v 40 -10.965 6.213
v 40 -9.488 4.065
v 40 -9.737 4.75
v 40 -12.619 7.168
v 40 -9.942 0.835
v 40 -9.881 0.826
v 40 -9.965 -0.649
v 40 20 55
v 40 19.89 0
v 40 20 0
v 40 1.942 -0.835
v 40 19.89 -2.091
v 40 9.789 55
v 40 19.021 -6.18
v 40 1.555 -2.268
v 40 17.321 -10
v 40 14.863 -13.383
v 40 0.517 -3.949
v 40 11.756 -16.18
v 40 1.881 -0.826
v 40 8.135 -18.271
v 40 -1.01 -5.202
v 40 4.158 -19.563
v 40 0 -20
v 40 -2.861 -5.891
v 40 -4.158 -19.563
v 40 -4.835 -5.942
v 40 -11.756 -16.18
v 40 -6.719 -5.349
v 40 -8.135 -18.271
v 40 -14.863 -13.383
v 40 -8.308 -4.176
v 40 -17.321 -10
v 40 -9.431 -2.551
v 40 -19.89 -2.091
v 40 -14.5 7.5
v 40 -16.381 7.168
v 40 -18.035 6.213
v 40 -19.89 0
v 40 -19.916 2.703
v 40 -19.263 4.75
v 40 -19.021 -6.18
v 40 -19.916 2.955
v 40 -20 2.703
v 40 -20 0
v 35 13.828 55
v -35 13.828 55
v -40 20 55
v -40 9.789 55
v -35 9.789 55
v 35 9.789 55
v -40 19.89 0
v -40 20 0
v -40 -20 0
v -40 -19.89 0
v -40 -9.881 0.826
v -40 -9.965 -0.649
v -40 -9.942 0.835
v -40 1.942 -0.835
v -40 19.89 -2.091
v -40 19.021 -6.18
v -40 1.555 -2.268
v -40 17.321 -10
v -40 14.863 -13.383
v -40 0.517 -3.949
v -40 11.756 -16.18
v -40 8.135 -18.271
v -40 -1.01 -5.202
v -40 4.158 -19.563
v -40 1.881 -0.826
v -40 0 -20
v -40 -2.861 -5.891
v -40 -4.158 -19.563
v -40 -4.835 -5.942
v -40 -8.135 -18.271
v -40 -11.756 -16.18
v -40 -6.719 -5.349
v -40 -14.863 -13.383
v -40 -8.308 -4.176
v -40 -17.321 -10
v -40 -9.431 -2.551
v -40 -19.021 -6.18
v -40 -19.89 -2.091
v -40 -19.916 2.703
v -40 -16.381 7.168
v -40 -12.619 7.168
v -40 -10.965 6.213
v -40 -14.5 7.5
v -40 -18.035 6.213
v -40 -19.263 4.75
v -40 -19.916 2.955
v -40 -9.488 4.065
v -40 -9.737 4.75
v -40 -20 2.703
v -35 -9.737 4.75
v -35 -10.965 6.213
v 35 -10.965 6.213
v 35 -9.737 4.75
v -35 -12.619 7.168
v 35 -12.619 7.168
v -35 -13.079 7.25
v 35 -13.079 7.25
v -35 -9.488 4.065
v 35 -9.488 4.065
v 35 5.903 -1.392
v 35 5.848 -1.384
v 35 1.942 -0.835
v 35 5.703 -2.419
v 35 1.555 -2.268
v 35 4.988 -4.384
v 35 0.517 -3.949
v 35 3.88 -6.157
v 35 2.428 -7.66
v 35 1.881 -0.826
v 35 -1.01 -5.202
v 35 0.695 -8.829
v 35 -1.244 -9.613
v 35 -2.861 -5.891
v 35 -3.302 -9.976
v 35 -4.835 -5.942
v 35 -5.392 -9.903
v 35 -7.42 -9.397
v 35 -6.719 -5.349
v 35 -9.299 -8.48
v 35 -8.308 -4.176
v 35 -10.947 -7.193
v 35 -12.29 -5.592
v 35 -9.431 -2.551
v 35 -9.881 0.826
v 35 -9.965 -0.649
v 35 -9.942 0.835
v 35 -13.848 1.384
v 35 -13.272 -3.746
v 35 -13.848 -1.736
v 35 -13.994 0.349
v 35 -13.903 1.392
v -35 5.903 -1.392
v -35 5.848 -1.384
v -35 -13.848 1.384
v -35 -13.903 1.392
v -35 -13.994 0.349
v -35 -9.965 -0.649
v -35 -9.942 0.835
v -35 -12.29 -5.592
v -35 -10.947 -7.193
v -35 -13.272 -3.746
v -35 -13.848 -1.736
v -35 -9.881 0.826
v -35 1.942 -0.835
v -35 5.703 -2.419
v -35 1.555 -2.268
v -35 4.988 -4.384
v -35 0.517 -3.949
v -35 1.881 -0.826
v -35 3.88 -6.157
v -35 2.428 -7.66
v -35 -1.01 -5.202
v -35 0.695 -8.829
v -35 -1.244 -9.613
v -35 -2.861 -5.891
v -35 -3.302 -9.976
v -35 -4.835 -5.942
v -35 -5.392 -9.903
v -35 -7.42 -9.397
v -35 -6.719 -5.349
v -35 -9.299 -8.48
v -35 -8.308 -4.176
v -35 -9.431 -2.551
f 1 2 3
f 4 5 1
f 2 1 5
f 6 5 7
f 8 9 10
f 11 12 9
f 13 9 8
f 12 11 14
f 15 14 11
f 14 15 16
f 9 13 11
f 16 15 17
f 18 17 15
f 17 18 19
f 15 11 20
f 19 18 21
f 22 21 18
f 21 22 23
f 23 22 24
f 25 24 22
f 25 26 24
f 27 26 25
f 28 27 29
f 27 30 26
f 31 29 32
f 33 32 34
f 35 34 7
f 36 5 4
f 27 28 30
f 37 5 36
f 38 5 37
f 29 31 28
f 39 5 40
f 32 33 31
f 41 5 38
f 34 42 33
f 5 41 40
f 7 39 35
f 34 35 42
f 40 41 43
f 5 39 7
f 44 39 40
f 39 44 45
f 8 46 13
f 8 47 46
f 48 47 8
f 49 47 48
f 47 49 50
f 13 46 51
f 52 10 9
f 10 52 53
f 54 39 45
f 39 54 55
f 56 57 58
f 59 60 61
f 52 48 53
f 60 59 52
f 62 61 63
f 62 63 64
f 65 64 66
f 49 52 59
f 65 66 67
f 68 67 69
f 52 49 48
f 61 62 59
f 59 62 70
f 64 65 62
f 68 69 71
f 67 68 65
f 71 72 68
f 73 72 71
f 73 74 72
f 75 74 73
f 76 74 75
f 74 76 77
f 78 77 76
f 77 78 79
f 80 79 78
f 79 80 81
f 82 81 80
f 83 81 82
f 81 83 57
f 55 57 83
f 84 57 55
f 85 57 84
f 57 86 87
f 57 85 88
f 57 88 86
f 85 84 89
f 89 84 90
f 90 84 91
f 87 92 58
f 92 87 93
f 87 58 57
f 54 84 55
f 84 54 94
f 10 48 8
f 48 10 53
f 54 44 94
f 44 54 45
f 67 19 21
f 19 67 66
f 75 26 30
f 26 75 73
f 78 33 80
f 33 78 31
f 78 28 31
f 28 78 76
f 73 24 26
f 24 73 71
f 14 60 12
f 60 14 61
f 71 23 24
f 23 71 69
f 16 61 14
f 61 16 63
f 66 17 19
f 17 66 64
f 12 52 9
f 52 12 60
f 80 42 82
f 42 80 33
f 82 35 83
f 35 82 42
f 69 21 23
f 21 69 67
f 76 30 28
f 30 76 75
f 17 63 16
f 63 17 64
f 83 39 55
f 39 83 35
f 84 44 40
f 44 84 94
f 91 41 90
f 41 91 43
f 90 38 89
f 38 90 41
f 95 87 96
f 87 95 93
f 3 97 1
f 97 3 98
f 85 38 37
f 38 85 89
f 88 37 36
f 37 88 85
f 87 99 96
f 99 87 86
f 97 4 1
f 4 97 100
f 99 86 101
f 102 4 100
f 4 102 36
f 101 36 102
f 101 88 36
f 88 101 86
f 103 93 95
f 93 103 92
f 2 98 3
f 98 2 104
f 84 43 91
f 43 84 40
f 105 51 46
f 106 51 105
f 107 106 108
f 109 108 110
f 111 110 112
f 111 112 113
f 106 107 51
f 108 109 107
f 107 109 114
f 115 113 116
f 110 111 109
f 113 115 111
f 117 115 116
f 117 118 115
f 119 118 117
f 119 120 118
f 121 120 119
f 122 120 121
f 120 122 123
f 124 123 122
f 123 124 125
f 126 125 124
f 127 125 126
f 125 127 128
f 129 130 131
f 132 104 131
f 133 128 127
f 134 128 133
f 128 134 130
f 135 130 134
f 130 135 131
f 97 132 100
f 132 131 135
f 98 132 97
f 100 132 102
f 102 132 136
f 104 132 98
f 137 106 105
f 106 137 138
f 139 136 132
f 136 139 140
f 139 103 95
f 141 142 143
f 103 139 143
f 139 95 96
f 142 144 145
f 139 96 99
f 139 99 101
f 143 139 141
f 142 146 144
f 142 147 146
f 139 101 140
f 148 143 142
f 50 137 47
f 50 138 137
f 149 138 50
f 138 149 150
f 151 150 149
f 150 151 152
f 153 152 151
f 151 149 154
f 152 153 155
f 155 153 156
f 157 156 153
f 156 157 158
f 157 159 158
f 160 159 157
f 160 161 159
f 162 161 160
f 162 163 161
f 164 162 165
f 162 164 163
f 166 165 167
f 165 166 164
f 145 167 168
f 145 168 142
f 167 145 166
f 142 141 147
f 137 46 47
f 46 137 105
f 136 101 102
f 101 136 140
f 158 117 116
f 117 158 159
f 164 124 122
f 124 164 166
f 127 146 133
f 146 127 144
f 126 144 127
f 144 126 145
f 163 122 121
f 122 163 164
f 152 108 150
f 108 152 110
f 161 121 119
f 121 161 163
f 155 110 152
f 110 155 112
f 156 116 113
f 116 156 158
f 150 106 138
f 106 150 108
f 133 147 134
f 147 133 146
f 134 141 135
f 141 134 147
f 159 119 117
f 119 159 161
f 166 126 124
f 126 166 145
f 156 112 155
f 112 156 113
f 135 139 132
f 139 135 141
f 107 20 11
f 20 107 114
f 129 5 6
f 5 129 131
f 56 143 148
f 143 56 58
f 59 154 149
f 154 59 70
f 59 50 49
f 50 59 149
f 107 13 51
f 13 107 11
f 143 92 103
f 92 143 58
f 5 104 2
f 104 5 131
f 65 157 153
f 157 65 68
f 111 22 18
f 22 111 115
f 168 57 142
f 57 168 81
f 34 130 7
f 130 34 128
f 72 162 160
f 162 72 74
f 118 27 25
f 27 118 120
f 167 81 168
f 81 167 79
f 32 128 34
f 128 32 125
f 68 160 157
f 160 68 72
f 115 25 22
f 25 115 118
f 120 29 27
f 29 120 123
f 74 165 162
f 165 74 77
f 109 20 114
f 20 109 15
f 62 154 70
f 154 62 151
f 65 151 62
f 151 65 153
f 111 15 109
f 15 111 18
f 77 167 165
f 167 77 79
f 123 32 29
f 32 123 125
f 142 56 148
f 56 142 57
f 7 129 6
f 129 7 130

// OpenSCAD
module roundedSlab(width, breadth, height) {
  union() {
    translate([-width/2, -breadth/2, 0])
    cube([width, breadth, height]);
    color("pink")
    rotate([0,90,0])
    cylinder(h = width, r=breadth/2, center=true);
  }
}

module holderBody(){
  width = 80;
  angle = -8;
  depth = 40;
  union(){
    difference(){
      union() {
        difference() {
          roundedSlab(width, depth, 55);
//          color("red")
//          translate([-25,depth/2,0])
//          cube([50,20,300]);

          translate([0,-4,0])
          rotate([angle,0,0])
          color("lime")
          translate([-150, -55, -5])
          rotate([-angle, 0, 0])
          cube([300,60, 120]);
          
        }
        color("brown")
        translate([0,-14.5,2])
        rotate([0,90,0])
        cylinder(h = width, r=5.5, center=true);
      }
  
      translate([0,-4,0])
      rotate([angle,0,0])
      union() {
        color("blue")
        roundedSlab(width-10, 20, 100);
        color("green")
        roundedSlab(190, 12, 120);
      }
    }

  }
}

holderBody();
